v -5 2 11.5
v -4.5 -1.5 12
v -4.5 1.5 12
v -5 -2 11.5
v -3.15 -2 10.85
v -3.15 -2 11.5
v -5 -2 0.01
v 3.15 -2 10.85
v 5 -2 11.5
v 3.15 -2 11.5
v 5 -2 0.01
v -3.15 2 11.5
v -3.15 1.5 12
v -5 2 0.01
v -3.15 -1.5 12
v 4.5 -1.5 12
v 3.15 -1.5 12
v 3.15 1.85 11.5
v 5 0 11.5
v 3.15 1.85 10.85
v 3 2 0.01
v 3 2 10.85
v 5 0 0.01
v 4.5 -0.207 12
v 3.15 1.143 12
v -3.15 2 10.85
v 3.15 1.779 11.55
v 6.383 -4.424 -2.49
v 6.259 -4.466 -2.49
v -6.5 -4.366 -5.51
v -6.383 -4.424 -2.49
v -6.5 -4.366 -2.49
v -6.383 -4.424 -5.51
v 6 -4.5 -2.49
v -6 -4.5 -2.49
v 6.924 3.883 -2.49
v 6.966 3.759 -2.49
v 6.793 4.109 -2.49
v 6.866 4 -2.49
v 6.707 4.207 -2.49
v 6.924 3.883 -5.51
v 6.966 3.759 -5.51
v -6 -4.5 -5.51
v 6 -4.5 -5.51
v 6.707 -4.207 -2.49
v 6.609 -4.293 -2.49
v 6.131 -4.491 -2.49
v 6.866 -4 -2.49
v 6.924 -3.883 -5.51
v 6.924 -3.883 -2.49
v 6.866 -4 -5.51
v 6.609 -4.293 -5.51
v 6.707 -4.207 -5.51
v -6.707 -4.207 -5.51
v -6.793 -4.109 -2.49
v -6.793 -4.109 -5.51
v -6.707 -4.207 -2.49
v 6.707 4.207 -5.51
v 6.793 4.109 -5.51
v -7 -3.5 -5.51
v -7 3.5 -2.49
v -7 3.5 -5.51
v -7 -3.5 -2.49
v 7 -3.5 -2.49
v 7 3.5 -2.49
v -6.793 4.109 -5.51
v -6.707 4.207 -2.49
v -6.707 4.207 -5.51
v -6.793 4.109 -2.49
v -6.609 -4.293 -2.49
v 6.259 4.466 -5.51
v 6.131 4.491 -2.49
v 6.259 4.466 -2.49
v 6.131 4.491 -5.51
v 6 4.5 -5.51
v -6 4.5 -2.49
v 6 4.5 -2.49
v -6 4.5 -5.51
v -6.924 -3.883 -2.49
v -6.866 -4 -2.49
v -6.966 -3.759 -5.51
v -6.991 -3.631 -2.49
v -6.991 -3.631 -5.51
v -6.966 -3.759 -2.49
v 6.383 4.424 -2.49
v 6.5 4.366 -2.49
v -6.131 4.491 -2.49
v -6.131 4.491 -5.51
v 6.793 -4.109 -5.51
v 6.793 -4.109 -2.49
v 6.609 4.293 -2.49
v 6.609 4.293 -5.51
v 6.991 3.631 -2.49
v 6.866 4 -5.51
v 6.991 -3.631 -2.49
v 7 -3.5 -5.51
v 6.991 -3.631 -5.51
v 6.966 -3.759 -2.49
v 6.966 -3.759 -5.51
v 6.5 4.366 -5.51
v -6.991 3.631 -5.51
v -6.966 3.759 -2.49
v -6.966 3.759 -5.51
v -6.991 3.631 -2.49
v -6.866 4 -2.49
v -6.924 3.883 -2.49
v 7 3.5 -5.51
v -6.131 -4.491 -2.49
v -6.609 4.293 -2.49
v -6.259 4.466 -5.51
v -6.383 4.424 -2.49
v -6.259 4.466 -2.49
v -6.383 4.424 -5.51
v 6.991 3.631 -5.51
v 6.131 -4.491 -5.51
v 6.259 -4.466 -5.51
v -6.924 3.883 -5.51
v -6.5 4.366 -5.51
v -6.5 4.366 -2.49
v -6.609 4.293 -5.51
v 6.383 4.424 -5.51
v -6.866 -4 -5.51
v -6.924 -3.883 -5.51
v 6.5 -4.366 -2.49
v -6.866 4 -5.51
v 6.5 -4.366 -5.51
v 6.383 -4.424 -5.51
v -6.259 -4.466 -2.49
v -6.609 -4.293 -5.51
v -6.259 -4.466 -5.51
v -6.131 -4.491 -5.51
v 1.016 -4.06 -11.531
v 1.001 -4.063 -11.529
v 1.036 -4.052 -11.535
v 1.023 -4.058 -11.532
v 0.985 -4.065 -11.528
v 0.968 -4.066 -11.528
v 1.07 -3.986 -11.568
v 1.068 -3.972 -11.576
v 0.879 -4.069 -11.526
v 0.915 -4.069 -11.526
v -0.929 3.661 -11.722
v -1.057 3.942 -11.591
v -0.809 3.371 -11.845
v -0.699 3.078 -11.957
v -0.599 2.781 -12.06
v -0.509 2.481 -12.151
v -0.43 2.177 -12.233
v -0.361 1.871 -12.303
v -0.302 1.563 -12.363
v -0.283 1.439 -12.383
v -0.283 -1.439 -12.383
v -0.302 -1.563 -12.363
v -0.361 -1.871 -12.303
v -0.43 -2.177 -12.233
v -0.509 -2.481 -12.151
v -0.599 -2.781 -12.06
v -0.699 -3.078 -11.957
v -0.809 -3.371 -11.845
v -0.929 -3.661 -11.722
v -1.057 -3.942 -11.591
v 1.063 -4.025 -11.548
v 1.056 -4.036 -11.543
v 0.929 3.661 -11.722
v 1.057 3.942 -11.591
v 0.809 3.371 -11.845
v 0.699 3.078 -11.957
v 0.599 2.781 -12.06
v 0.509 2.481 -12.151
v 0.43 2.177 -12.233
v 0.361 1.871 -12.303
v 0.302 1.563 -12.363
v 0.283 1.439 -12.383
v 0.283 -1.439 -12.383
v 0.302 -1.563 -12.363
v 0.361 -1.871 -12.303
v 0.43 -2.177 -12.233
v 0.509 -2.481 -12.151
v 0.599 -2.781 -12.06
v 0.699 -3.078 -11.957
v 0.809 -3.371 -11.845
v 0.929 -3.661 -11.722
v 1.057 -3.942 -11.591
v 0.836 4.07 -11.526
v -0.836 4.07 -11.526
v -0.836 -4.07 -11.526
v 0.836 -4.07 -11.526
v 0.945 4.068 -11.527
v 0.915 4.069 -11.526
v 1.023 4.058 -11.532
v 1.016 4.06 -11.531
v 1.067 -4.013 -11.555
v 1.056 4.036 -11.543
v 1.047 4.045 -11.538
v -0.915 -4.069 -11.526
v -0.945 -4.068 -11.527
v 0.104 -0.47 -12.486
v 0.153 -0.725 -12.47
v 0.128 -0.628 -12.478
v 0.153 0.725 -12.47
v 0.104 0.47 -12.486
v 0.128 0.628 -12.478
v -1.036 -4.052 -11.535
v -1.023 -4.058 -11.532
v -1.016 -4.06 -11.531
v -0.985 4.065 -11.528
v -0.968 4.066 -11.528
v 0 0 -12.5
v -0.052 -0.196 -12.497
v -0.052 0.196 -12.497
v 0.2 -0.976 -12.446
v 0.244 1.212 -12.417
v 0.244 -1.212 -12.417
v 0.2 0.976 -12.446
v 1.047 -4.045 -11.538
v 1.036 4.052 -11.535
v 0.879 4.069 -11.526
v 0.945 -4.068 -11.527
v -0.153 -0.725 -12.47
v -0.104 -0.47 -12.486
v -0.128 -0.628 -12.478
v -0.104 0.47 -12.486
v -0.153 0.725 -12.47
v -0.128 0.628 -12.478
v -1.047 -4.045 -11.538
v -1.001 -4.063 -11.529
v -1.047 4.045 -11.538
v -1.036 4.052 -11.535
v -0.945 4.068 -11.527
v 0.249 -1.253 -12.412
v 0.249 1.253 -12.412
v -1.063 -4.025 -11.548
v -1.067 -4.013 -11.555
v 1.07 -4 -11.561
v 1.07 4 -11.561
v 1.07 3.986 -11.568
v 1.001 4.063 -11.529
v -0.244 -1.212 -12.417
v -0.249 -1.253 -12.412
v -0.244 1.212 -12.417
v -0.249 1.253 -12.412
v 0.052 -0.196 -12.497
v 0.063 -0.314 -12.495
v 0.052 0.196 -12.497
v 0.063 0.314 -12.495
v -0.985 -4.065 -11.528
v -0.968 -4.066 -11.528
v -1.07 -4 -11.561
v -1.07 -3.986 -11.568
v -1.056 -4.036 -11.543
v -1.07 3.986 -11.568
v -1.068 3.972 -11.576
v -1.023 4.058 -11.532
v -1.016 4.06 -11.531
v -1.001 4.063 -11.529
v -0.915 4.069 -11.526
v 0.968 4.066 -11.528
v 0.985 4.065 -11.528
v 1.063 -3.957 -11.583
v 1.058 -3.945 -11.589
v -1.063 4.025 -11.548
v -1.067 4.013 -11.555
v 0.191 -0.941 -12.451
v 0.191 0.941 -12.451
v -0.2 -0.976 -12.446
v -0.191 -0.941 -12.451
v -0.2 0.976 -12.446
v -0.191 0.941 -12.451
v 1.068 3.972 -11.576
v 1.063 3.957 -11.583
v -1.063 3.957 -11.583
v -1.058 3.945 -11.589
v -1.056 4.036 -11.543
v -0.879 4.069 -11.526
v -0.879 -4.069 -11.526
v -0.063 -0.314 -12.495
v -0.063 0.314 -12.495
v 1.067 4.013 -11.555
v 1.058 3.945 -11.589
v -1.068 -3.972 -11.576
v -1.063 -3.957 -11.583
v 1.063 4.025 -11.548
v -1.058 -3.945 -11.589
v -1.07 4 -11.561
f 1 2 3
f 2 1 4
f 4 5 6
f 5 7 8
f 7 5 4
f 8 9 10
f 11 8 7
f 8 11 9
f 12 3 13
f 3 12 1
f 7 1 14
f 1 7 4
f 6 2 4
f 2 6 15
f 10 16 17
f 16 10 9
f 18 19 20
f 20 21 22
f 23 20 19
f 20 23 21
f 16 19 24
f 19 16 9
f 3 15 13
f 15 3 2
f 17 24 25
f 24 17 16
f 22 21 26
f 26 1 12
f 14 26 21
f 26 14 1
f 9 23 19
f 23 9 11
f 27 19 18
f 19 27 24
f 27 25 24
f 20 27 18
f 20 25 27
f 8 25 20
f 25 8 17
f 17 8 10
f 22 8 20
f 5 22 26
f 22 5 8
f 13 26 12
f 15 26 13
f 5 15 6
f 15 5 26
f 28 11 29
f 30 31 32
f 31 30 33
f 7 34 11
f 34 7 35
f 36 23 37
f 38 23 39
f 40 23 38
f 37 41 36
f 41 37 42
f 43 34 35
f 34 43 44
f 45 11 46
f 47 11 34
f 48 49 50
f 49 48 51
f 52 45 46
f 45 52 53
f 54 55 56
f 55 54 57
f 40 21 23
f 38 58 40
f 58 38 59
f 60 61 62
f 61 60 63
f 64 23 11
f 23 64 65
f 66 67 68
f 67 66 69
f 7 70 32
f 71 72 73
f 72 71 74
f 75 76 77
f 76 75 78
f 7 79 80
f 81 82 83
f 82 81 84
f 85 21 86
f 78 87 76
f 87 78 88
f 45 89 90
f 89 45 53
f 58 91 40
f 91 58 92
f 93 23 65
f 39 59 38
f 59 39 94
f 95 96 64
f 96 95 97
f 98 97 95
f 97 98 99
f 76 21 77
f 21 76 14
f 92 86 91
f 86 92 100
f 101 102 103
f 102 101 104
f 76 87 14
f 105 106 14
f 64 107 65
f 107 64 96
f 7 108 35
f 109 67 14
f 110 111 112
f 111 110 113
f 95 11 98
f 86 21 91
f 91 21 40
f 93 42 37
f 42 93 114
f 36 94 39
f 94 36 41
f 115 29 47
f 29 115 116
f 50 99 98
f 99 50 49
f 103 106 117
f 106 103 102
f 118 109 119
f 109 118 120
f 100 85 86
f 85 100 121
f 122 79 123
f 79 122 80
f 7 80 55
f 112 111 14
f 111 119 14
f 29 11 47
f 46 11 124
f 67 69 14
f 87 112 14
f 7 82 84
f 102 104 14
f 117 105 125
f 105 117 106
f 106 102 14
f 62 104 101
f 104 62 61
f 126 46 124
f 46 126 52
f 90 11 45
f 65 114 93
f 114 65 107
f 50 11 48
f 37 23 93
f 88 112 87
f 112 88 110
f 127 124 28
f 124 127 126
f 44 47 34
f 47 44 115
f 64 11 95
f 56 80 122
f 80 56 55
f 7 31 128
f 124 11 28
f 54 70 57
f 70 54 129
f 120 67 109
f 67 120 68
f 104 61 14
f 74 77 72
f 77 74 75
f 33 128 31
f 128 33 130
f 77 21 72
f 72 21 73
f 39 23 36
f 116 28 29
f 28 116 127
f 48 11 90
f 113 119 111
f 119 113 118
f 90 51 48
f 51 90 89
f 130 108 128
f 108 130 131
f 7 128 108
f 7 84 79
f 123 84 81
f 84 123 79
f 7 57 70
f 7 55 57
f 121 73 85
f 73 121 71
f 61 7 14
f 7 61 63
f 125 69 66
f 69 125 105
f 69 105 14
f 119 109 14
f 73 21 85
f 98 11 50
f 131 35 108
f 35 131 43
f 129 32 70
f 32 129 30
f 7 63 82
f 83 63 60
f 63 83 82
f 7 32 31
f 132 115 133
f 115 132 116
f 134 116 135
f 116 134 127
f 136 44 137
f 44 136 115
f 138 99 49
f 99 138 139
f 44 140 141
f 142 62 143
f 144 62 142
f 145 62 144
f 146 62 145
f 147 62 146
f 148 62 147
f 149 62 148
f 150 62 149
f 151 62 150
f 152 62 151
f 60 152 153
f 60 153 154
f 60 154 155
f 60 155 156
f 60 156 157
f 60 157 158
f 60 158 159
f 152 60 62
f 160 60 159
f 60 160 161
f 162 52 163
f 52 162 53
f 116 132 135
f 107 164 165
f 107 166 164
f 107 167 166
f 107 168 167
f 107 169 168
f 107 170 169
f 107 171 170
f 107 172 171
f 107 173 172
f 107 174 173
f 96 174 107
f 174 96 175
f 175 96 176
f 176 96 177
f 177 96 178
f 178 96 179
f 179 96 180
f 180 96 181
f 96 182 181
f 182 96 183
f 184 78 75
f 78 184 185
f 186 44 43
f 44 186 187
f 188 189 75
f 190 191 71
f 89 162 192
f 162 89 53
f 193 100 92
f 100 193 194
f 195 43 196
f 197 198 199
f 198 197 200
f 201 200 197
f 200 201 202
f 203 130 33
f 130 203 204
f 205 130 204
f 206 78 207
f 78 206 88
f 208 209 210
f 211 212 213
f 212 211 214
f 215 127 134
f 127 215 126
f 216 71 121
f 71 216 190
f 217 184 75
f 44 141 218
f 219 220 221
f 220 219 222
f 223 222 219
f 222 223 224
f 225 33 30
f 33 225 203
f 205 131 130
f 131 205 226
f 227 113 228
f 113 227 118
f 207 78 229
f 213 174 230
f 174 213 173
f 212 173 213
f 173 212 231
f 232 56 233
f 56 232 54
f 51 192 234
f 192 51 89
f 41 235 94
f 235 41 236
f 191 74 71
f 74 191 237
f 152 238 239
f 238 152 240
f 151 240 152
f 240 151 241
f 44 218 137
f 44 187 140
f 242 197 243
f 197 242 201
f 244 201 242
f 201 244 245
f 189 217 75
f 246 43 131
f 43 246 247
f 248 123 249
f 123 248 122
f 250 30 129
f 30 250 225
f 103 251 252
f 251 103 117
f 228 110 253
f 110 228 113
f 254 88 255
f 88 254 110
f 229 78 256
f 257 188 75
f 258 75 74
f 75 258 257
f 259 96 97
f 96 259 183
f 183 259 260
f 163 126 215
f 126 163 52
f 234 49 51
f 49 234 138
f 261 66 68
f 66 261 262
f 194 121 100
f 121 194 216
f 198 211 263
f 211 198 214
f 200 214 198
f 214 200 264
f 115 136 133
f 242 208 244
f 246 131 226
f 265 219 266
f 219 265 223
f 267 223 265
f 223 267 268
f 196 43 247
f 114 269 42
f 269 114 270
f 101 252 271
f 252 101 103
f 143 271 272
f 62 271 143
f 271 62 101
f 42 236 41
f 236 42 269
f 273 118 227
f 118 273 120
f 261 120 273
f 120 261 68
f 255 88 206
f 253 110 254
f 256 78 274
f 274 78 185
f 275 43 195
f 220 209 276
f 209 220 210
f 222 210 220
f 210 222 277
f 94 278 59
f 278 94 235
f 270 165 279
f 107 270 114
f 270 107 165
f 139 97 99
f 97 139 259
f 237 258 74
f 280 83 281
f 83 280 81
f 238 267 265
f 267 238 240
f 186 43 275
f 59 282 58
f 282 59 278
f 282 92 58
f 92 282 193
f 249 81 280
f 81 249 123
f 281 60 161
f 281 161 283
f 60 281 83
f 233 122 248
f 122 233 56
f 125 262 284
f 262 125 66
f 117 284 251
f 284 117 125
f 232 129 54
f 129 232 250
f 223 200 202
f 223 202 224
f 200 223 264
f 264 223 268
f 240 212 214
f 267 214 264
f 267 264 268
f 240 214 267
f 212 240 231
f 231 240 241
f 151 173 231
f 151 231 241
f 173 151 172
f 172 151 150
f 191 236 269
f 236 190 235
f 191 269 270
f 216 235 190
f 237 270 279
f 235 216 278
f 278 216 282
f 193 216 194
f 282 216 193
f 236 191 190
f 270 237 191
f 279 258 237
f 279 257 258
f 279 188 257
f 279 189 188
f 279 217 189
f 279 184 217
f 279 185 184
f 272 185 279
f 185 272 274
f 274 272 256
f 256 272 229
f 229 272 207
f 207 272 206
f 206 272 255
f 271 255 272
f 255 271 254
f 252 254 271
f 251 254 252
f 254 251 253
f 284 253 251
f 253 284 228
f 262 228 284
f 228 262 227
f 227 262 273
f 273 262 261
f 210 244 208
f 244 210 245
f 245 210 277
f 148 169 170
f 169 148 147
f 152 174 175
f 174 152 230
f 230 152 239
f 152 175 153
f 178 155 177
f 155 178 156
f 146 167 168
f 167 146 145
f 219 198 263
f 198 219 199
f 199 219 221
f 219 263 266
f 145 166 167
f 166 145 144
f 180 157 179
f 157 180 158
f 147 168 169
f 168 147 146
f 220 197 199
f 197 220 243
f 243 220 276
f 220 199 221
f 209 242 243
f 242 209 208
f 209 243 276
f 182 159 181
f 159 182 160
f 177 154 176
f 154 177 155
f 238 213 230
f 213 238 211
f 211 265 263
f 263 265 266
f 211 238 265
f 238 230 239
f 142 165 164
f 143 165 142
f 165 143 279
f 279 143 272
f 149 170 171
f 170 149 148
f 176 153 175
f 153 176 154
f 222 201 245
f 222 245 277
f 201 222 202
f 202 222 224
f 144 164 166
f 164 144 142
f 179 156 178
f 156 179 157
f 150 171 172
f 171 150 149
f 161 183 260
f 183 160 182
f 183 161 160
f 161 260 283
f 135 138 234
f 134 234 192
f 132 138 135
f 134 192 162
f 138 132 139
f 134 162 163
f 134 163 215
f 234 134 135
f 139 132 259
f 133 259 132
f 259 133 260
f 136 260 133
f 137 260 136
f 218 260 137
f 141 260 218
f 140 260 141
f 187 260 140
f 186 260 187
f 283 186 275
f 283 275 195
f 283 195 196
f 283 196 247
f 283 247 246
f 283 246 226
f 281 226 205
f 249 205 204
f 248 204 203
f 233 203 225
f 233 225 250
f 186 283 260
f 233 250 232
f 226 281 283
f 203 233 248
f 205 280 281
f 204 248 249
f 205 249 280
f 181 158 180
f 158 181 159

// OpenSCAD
// =====================================================================
//  tip_W.scad — SP1 tip W: symmetric WEDGE (DEFAULT, bidirectional raking)
//  PROJECT SCRATCH · 05-engineering/cad/tips · units: mm
//  8 mm edge along Y, two 45 deg faces (90 deg included), edge R 0.4 mm,
//  transverse crown R 9 (edge ends rise 0.9 mm so the centre loads first).
//  Lowest point of the edge: z = -12.5 (7.0 mm below the shoulder band).
//  Print: PETG, ON ITS SIDE (model Y vertical, edge line running up the print),
//  supports under the tang only, 0.10 mm layers, 3 perimeters, 100 % infill.
//  Finish: sand the apex 400 -> 1000 -> 2000 wet to R 0.4; hand-round the two
//  edge-end corners to R 1.5; optional 1 s flame pass (PETG only).
// =====================================================================
include <tm1_tang_lib.scad>
$fn = TM1_FN;

W_EDGE_W   = 8.0;    // edge length along Y
W_EDGE_R   = 0.4;    // modelled apex radius (sand to this after printing)
W_HEIGHT   = 7.0;    // shoulder band bottom to apex. Faces are 45.7 deg to the scalp plane
                     // (tangent from the band corner to the R 0.4 apex; 6.83 would give 45.0)
W_CROWN_R  = 9.0;    // transverse crown radius (index-nail value)
CROSS_HOLE = false;  // true adds the 3.2 mm TM1-B cross-bolt hole in the tang

module tip_W(w = W_EDGE_W, r = W_EDGE_R, h = W_HEIGHT, crown_r = W_CROWN_R, cross_hole = CROSS_HOLE) {
    z_apex = TM1_SH_BOT - h;
    tm1_tip_base(cross_hole);
    intersection() {
        hull() {
            tm1_band_slab();
            tm1_ycyl(r, w, 0, z_apex + r);      // apex edge cylinder along Y
        }
        tm1_crown(crown_r, z_apex);
    }
}

tip_W();
